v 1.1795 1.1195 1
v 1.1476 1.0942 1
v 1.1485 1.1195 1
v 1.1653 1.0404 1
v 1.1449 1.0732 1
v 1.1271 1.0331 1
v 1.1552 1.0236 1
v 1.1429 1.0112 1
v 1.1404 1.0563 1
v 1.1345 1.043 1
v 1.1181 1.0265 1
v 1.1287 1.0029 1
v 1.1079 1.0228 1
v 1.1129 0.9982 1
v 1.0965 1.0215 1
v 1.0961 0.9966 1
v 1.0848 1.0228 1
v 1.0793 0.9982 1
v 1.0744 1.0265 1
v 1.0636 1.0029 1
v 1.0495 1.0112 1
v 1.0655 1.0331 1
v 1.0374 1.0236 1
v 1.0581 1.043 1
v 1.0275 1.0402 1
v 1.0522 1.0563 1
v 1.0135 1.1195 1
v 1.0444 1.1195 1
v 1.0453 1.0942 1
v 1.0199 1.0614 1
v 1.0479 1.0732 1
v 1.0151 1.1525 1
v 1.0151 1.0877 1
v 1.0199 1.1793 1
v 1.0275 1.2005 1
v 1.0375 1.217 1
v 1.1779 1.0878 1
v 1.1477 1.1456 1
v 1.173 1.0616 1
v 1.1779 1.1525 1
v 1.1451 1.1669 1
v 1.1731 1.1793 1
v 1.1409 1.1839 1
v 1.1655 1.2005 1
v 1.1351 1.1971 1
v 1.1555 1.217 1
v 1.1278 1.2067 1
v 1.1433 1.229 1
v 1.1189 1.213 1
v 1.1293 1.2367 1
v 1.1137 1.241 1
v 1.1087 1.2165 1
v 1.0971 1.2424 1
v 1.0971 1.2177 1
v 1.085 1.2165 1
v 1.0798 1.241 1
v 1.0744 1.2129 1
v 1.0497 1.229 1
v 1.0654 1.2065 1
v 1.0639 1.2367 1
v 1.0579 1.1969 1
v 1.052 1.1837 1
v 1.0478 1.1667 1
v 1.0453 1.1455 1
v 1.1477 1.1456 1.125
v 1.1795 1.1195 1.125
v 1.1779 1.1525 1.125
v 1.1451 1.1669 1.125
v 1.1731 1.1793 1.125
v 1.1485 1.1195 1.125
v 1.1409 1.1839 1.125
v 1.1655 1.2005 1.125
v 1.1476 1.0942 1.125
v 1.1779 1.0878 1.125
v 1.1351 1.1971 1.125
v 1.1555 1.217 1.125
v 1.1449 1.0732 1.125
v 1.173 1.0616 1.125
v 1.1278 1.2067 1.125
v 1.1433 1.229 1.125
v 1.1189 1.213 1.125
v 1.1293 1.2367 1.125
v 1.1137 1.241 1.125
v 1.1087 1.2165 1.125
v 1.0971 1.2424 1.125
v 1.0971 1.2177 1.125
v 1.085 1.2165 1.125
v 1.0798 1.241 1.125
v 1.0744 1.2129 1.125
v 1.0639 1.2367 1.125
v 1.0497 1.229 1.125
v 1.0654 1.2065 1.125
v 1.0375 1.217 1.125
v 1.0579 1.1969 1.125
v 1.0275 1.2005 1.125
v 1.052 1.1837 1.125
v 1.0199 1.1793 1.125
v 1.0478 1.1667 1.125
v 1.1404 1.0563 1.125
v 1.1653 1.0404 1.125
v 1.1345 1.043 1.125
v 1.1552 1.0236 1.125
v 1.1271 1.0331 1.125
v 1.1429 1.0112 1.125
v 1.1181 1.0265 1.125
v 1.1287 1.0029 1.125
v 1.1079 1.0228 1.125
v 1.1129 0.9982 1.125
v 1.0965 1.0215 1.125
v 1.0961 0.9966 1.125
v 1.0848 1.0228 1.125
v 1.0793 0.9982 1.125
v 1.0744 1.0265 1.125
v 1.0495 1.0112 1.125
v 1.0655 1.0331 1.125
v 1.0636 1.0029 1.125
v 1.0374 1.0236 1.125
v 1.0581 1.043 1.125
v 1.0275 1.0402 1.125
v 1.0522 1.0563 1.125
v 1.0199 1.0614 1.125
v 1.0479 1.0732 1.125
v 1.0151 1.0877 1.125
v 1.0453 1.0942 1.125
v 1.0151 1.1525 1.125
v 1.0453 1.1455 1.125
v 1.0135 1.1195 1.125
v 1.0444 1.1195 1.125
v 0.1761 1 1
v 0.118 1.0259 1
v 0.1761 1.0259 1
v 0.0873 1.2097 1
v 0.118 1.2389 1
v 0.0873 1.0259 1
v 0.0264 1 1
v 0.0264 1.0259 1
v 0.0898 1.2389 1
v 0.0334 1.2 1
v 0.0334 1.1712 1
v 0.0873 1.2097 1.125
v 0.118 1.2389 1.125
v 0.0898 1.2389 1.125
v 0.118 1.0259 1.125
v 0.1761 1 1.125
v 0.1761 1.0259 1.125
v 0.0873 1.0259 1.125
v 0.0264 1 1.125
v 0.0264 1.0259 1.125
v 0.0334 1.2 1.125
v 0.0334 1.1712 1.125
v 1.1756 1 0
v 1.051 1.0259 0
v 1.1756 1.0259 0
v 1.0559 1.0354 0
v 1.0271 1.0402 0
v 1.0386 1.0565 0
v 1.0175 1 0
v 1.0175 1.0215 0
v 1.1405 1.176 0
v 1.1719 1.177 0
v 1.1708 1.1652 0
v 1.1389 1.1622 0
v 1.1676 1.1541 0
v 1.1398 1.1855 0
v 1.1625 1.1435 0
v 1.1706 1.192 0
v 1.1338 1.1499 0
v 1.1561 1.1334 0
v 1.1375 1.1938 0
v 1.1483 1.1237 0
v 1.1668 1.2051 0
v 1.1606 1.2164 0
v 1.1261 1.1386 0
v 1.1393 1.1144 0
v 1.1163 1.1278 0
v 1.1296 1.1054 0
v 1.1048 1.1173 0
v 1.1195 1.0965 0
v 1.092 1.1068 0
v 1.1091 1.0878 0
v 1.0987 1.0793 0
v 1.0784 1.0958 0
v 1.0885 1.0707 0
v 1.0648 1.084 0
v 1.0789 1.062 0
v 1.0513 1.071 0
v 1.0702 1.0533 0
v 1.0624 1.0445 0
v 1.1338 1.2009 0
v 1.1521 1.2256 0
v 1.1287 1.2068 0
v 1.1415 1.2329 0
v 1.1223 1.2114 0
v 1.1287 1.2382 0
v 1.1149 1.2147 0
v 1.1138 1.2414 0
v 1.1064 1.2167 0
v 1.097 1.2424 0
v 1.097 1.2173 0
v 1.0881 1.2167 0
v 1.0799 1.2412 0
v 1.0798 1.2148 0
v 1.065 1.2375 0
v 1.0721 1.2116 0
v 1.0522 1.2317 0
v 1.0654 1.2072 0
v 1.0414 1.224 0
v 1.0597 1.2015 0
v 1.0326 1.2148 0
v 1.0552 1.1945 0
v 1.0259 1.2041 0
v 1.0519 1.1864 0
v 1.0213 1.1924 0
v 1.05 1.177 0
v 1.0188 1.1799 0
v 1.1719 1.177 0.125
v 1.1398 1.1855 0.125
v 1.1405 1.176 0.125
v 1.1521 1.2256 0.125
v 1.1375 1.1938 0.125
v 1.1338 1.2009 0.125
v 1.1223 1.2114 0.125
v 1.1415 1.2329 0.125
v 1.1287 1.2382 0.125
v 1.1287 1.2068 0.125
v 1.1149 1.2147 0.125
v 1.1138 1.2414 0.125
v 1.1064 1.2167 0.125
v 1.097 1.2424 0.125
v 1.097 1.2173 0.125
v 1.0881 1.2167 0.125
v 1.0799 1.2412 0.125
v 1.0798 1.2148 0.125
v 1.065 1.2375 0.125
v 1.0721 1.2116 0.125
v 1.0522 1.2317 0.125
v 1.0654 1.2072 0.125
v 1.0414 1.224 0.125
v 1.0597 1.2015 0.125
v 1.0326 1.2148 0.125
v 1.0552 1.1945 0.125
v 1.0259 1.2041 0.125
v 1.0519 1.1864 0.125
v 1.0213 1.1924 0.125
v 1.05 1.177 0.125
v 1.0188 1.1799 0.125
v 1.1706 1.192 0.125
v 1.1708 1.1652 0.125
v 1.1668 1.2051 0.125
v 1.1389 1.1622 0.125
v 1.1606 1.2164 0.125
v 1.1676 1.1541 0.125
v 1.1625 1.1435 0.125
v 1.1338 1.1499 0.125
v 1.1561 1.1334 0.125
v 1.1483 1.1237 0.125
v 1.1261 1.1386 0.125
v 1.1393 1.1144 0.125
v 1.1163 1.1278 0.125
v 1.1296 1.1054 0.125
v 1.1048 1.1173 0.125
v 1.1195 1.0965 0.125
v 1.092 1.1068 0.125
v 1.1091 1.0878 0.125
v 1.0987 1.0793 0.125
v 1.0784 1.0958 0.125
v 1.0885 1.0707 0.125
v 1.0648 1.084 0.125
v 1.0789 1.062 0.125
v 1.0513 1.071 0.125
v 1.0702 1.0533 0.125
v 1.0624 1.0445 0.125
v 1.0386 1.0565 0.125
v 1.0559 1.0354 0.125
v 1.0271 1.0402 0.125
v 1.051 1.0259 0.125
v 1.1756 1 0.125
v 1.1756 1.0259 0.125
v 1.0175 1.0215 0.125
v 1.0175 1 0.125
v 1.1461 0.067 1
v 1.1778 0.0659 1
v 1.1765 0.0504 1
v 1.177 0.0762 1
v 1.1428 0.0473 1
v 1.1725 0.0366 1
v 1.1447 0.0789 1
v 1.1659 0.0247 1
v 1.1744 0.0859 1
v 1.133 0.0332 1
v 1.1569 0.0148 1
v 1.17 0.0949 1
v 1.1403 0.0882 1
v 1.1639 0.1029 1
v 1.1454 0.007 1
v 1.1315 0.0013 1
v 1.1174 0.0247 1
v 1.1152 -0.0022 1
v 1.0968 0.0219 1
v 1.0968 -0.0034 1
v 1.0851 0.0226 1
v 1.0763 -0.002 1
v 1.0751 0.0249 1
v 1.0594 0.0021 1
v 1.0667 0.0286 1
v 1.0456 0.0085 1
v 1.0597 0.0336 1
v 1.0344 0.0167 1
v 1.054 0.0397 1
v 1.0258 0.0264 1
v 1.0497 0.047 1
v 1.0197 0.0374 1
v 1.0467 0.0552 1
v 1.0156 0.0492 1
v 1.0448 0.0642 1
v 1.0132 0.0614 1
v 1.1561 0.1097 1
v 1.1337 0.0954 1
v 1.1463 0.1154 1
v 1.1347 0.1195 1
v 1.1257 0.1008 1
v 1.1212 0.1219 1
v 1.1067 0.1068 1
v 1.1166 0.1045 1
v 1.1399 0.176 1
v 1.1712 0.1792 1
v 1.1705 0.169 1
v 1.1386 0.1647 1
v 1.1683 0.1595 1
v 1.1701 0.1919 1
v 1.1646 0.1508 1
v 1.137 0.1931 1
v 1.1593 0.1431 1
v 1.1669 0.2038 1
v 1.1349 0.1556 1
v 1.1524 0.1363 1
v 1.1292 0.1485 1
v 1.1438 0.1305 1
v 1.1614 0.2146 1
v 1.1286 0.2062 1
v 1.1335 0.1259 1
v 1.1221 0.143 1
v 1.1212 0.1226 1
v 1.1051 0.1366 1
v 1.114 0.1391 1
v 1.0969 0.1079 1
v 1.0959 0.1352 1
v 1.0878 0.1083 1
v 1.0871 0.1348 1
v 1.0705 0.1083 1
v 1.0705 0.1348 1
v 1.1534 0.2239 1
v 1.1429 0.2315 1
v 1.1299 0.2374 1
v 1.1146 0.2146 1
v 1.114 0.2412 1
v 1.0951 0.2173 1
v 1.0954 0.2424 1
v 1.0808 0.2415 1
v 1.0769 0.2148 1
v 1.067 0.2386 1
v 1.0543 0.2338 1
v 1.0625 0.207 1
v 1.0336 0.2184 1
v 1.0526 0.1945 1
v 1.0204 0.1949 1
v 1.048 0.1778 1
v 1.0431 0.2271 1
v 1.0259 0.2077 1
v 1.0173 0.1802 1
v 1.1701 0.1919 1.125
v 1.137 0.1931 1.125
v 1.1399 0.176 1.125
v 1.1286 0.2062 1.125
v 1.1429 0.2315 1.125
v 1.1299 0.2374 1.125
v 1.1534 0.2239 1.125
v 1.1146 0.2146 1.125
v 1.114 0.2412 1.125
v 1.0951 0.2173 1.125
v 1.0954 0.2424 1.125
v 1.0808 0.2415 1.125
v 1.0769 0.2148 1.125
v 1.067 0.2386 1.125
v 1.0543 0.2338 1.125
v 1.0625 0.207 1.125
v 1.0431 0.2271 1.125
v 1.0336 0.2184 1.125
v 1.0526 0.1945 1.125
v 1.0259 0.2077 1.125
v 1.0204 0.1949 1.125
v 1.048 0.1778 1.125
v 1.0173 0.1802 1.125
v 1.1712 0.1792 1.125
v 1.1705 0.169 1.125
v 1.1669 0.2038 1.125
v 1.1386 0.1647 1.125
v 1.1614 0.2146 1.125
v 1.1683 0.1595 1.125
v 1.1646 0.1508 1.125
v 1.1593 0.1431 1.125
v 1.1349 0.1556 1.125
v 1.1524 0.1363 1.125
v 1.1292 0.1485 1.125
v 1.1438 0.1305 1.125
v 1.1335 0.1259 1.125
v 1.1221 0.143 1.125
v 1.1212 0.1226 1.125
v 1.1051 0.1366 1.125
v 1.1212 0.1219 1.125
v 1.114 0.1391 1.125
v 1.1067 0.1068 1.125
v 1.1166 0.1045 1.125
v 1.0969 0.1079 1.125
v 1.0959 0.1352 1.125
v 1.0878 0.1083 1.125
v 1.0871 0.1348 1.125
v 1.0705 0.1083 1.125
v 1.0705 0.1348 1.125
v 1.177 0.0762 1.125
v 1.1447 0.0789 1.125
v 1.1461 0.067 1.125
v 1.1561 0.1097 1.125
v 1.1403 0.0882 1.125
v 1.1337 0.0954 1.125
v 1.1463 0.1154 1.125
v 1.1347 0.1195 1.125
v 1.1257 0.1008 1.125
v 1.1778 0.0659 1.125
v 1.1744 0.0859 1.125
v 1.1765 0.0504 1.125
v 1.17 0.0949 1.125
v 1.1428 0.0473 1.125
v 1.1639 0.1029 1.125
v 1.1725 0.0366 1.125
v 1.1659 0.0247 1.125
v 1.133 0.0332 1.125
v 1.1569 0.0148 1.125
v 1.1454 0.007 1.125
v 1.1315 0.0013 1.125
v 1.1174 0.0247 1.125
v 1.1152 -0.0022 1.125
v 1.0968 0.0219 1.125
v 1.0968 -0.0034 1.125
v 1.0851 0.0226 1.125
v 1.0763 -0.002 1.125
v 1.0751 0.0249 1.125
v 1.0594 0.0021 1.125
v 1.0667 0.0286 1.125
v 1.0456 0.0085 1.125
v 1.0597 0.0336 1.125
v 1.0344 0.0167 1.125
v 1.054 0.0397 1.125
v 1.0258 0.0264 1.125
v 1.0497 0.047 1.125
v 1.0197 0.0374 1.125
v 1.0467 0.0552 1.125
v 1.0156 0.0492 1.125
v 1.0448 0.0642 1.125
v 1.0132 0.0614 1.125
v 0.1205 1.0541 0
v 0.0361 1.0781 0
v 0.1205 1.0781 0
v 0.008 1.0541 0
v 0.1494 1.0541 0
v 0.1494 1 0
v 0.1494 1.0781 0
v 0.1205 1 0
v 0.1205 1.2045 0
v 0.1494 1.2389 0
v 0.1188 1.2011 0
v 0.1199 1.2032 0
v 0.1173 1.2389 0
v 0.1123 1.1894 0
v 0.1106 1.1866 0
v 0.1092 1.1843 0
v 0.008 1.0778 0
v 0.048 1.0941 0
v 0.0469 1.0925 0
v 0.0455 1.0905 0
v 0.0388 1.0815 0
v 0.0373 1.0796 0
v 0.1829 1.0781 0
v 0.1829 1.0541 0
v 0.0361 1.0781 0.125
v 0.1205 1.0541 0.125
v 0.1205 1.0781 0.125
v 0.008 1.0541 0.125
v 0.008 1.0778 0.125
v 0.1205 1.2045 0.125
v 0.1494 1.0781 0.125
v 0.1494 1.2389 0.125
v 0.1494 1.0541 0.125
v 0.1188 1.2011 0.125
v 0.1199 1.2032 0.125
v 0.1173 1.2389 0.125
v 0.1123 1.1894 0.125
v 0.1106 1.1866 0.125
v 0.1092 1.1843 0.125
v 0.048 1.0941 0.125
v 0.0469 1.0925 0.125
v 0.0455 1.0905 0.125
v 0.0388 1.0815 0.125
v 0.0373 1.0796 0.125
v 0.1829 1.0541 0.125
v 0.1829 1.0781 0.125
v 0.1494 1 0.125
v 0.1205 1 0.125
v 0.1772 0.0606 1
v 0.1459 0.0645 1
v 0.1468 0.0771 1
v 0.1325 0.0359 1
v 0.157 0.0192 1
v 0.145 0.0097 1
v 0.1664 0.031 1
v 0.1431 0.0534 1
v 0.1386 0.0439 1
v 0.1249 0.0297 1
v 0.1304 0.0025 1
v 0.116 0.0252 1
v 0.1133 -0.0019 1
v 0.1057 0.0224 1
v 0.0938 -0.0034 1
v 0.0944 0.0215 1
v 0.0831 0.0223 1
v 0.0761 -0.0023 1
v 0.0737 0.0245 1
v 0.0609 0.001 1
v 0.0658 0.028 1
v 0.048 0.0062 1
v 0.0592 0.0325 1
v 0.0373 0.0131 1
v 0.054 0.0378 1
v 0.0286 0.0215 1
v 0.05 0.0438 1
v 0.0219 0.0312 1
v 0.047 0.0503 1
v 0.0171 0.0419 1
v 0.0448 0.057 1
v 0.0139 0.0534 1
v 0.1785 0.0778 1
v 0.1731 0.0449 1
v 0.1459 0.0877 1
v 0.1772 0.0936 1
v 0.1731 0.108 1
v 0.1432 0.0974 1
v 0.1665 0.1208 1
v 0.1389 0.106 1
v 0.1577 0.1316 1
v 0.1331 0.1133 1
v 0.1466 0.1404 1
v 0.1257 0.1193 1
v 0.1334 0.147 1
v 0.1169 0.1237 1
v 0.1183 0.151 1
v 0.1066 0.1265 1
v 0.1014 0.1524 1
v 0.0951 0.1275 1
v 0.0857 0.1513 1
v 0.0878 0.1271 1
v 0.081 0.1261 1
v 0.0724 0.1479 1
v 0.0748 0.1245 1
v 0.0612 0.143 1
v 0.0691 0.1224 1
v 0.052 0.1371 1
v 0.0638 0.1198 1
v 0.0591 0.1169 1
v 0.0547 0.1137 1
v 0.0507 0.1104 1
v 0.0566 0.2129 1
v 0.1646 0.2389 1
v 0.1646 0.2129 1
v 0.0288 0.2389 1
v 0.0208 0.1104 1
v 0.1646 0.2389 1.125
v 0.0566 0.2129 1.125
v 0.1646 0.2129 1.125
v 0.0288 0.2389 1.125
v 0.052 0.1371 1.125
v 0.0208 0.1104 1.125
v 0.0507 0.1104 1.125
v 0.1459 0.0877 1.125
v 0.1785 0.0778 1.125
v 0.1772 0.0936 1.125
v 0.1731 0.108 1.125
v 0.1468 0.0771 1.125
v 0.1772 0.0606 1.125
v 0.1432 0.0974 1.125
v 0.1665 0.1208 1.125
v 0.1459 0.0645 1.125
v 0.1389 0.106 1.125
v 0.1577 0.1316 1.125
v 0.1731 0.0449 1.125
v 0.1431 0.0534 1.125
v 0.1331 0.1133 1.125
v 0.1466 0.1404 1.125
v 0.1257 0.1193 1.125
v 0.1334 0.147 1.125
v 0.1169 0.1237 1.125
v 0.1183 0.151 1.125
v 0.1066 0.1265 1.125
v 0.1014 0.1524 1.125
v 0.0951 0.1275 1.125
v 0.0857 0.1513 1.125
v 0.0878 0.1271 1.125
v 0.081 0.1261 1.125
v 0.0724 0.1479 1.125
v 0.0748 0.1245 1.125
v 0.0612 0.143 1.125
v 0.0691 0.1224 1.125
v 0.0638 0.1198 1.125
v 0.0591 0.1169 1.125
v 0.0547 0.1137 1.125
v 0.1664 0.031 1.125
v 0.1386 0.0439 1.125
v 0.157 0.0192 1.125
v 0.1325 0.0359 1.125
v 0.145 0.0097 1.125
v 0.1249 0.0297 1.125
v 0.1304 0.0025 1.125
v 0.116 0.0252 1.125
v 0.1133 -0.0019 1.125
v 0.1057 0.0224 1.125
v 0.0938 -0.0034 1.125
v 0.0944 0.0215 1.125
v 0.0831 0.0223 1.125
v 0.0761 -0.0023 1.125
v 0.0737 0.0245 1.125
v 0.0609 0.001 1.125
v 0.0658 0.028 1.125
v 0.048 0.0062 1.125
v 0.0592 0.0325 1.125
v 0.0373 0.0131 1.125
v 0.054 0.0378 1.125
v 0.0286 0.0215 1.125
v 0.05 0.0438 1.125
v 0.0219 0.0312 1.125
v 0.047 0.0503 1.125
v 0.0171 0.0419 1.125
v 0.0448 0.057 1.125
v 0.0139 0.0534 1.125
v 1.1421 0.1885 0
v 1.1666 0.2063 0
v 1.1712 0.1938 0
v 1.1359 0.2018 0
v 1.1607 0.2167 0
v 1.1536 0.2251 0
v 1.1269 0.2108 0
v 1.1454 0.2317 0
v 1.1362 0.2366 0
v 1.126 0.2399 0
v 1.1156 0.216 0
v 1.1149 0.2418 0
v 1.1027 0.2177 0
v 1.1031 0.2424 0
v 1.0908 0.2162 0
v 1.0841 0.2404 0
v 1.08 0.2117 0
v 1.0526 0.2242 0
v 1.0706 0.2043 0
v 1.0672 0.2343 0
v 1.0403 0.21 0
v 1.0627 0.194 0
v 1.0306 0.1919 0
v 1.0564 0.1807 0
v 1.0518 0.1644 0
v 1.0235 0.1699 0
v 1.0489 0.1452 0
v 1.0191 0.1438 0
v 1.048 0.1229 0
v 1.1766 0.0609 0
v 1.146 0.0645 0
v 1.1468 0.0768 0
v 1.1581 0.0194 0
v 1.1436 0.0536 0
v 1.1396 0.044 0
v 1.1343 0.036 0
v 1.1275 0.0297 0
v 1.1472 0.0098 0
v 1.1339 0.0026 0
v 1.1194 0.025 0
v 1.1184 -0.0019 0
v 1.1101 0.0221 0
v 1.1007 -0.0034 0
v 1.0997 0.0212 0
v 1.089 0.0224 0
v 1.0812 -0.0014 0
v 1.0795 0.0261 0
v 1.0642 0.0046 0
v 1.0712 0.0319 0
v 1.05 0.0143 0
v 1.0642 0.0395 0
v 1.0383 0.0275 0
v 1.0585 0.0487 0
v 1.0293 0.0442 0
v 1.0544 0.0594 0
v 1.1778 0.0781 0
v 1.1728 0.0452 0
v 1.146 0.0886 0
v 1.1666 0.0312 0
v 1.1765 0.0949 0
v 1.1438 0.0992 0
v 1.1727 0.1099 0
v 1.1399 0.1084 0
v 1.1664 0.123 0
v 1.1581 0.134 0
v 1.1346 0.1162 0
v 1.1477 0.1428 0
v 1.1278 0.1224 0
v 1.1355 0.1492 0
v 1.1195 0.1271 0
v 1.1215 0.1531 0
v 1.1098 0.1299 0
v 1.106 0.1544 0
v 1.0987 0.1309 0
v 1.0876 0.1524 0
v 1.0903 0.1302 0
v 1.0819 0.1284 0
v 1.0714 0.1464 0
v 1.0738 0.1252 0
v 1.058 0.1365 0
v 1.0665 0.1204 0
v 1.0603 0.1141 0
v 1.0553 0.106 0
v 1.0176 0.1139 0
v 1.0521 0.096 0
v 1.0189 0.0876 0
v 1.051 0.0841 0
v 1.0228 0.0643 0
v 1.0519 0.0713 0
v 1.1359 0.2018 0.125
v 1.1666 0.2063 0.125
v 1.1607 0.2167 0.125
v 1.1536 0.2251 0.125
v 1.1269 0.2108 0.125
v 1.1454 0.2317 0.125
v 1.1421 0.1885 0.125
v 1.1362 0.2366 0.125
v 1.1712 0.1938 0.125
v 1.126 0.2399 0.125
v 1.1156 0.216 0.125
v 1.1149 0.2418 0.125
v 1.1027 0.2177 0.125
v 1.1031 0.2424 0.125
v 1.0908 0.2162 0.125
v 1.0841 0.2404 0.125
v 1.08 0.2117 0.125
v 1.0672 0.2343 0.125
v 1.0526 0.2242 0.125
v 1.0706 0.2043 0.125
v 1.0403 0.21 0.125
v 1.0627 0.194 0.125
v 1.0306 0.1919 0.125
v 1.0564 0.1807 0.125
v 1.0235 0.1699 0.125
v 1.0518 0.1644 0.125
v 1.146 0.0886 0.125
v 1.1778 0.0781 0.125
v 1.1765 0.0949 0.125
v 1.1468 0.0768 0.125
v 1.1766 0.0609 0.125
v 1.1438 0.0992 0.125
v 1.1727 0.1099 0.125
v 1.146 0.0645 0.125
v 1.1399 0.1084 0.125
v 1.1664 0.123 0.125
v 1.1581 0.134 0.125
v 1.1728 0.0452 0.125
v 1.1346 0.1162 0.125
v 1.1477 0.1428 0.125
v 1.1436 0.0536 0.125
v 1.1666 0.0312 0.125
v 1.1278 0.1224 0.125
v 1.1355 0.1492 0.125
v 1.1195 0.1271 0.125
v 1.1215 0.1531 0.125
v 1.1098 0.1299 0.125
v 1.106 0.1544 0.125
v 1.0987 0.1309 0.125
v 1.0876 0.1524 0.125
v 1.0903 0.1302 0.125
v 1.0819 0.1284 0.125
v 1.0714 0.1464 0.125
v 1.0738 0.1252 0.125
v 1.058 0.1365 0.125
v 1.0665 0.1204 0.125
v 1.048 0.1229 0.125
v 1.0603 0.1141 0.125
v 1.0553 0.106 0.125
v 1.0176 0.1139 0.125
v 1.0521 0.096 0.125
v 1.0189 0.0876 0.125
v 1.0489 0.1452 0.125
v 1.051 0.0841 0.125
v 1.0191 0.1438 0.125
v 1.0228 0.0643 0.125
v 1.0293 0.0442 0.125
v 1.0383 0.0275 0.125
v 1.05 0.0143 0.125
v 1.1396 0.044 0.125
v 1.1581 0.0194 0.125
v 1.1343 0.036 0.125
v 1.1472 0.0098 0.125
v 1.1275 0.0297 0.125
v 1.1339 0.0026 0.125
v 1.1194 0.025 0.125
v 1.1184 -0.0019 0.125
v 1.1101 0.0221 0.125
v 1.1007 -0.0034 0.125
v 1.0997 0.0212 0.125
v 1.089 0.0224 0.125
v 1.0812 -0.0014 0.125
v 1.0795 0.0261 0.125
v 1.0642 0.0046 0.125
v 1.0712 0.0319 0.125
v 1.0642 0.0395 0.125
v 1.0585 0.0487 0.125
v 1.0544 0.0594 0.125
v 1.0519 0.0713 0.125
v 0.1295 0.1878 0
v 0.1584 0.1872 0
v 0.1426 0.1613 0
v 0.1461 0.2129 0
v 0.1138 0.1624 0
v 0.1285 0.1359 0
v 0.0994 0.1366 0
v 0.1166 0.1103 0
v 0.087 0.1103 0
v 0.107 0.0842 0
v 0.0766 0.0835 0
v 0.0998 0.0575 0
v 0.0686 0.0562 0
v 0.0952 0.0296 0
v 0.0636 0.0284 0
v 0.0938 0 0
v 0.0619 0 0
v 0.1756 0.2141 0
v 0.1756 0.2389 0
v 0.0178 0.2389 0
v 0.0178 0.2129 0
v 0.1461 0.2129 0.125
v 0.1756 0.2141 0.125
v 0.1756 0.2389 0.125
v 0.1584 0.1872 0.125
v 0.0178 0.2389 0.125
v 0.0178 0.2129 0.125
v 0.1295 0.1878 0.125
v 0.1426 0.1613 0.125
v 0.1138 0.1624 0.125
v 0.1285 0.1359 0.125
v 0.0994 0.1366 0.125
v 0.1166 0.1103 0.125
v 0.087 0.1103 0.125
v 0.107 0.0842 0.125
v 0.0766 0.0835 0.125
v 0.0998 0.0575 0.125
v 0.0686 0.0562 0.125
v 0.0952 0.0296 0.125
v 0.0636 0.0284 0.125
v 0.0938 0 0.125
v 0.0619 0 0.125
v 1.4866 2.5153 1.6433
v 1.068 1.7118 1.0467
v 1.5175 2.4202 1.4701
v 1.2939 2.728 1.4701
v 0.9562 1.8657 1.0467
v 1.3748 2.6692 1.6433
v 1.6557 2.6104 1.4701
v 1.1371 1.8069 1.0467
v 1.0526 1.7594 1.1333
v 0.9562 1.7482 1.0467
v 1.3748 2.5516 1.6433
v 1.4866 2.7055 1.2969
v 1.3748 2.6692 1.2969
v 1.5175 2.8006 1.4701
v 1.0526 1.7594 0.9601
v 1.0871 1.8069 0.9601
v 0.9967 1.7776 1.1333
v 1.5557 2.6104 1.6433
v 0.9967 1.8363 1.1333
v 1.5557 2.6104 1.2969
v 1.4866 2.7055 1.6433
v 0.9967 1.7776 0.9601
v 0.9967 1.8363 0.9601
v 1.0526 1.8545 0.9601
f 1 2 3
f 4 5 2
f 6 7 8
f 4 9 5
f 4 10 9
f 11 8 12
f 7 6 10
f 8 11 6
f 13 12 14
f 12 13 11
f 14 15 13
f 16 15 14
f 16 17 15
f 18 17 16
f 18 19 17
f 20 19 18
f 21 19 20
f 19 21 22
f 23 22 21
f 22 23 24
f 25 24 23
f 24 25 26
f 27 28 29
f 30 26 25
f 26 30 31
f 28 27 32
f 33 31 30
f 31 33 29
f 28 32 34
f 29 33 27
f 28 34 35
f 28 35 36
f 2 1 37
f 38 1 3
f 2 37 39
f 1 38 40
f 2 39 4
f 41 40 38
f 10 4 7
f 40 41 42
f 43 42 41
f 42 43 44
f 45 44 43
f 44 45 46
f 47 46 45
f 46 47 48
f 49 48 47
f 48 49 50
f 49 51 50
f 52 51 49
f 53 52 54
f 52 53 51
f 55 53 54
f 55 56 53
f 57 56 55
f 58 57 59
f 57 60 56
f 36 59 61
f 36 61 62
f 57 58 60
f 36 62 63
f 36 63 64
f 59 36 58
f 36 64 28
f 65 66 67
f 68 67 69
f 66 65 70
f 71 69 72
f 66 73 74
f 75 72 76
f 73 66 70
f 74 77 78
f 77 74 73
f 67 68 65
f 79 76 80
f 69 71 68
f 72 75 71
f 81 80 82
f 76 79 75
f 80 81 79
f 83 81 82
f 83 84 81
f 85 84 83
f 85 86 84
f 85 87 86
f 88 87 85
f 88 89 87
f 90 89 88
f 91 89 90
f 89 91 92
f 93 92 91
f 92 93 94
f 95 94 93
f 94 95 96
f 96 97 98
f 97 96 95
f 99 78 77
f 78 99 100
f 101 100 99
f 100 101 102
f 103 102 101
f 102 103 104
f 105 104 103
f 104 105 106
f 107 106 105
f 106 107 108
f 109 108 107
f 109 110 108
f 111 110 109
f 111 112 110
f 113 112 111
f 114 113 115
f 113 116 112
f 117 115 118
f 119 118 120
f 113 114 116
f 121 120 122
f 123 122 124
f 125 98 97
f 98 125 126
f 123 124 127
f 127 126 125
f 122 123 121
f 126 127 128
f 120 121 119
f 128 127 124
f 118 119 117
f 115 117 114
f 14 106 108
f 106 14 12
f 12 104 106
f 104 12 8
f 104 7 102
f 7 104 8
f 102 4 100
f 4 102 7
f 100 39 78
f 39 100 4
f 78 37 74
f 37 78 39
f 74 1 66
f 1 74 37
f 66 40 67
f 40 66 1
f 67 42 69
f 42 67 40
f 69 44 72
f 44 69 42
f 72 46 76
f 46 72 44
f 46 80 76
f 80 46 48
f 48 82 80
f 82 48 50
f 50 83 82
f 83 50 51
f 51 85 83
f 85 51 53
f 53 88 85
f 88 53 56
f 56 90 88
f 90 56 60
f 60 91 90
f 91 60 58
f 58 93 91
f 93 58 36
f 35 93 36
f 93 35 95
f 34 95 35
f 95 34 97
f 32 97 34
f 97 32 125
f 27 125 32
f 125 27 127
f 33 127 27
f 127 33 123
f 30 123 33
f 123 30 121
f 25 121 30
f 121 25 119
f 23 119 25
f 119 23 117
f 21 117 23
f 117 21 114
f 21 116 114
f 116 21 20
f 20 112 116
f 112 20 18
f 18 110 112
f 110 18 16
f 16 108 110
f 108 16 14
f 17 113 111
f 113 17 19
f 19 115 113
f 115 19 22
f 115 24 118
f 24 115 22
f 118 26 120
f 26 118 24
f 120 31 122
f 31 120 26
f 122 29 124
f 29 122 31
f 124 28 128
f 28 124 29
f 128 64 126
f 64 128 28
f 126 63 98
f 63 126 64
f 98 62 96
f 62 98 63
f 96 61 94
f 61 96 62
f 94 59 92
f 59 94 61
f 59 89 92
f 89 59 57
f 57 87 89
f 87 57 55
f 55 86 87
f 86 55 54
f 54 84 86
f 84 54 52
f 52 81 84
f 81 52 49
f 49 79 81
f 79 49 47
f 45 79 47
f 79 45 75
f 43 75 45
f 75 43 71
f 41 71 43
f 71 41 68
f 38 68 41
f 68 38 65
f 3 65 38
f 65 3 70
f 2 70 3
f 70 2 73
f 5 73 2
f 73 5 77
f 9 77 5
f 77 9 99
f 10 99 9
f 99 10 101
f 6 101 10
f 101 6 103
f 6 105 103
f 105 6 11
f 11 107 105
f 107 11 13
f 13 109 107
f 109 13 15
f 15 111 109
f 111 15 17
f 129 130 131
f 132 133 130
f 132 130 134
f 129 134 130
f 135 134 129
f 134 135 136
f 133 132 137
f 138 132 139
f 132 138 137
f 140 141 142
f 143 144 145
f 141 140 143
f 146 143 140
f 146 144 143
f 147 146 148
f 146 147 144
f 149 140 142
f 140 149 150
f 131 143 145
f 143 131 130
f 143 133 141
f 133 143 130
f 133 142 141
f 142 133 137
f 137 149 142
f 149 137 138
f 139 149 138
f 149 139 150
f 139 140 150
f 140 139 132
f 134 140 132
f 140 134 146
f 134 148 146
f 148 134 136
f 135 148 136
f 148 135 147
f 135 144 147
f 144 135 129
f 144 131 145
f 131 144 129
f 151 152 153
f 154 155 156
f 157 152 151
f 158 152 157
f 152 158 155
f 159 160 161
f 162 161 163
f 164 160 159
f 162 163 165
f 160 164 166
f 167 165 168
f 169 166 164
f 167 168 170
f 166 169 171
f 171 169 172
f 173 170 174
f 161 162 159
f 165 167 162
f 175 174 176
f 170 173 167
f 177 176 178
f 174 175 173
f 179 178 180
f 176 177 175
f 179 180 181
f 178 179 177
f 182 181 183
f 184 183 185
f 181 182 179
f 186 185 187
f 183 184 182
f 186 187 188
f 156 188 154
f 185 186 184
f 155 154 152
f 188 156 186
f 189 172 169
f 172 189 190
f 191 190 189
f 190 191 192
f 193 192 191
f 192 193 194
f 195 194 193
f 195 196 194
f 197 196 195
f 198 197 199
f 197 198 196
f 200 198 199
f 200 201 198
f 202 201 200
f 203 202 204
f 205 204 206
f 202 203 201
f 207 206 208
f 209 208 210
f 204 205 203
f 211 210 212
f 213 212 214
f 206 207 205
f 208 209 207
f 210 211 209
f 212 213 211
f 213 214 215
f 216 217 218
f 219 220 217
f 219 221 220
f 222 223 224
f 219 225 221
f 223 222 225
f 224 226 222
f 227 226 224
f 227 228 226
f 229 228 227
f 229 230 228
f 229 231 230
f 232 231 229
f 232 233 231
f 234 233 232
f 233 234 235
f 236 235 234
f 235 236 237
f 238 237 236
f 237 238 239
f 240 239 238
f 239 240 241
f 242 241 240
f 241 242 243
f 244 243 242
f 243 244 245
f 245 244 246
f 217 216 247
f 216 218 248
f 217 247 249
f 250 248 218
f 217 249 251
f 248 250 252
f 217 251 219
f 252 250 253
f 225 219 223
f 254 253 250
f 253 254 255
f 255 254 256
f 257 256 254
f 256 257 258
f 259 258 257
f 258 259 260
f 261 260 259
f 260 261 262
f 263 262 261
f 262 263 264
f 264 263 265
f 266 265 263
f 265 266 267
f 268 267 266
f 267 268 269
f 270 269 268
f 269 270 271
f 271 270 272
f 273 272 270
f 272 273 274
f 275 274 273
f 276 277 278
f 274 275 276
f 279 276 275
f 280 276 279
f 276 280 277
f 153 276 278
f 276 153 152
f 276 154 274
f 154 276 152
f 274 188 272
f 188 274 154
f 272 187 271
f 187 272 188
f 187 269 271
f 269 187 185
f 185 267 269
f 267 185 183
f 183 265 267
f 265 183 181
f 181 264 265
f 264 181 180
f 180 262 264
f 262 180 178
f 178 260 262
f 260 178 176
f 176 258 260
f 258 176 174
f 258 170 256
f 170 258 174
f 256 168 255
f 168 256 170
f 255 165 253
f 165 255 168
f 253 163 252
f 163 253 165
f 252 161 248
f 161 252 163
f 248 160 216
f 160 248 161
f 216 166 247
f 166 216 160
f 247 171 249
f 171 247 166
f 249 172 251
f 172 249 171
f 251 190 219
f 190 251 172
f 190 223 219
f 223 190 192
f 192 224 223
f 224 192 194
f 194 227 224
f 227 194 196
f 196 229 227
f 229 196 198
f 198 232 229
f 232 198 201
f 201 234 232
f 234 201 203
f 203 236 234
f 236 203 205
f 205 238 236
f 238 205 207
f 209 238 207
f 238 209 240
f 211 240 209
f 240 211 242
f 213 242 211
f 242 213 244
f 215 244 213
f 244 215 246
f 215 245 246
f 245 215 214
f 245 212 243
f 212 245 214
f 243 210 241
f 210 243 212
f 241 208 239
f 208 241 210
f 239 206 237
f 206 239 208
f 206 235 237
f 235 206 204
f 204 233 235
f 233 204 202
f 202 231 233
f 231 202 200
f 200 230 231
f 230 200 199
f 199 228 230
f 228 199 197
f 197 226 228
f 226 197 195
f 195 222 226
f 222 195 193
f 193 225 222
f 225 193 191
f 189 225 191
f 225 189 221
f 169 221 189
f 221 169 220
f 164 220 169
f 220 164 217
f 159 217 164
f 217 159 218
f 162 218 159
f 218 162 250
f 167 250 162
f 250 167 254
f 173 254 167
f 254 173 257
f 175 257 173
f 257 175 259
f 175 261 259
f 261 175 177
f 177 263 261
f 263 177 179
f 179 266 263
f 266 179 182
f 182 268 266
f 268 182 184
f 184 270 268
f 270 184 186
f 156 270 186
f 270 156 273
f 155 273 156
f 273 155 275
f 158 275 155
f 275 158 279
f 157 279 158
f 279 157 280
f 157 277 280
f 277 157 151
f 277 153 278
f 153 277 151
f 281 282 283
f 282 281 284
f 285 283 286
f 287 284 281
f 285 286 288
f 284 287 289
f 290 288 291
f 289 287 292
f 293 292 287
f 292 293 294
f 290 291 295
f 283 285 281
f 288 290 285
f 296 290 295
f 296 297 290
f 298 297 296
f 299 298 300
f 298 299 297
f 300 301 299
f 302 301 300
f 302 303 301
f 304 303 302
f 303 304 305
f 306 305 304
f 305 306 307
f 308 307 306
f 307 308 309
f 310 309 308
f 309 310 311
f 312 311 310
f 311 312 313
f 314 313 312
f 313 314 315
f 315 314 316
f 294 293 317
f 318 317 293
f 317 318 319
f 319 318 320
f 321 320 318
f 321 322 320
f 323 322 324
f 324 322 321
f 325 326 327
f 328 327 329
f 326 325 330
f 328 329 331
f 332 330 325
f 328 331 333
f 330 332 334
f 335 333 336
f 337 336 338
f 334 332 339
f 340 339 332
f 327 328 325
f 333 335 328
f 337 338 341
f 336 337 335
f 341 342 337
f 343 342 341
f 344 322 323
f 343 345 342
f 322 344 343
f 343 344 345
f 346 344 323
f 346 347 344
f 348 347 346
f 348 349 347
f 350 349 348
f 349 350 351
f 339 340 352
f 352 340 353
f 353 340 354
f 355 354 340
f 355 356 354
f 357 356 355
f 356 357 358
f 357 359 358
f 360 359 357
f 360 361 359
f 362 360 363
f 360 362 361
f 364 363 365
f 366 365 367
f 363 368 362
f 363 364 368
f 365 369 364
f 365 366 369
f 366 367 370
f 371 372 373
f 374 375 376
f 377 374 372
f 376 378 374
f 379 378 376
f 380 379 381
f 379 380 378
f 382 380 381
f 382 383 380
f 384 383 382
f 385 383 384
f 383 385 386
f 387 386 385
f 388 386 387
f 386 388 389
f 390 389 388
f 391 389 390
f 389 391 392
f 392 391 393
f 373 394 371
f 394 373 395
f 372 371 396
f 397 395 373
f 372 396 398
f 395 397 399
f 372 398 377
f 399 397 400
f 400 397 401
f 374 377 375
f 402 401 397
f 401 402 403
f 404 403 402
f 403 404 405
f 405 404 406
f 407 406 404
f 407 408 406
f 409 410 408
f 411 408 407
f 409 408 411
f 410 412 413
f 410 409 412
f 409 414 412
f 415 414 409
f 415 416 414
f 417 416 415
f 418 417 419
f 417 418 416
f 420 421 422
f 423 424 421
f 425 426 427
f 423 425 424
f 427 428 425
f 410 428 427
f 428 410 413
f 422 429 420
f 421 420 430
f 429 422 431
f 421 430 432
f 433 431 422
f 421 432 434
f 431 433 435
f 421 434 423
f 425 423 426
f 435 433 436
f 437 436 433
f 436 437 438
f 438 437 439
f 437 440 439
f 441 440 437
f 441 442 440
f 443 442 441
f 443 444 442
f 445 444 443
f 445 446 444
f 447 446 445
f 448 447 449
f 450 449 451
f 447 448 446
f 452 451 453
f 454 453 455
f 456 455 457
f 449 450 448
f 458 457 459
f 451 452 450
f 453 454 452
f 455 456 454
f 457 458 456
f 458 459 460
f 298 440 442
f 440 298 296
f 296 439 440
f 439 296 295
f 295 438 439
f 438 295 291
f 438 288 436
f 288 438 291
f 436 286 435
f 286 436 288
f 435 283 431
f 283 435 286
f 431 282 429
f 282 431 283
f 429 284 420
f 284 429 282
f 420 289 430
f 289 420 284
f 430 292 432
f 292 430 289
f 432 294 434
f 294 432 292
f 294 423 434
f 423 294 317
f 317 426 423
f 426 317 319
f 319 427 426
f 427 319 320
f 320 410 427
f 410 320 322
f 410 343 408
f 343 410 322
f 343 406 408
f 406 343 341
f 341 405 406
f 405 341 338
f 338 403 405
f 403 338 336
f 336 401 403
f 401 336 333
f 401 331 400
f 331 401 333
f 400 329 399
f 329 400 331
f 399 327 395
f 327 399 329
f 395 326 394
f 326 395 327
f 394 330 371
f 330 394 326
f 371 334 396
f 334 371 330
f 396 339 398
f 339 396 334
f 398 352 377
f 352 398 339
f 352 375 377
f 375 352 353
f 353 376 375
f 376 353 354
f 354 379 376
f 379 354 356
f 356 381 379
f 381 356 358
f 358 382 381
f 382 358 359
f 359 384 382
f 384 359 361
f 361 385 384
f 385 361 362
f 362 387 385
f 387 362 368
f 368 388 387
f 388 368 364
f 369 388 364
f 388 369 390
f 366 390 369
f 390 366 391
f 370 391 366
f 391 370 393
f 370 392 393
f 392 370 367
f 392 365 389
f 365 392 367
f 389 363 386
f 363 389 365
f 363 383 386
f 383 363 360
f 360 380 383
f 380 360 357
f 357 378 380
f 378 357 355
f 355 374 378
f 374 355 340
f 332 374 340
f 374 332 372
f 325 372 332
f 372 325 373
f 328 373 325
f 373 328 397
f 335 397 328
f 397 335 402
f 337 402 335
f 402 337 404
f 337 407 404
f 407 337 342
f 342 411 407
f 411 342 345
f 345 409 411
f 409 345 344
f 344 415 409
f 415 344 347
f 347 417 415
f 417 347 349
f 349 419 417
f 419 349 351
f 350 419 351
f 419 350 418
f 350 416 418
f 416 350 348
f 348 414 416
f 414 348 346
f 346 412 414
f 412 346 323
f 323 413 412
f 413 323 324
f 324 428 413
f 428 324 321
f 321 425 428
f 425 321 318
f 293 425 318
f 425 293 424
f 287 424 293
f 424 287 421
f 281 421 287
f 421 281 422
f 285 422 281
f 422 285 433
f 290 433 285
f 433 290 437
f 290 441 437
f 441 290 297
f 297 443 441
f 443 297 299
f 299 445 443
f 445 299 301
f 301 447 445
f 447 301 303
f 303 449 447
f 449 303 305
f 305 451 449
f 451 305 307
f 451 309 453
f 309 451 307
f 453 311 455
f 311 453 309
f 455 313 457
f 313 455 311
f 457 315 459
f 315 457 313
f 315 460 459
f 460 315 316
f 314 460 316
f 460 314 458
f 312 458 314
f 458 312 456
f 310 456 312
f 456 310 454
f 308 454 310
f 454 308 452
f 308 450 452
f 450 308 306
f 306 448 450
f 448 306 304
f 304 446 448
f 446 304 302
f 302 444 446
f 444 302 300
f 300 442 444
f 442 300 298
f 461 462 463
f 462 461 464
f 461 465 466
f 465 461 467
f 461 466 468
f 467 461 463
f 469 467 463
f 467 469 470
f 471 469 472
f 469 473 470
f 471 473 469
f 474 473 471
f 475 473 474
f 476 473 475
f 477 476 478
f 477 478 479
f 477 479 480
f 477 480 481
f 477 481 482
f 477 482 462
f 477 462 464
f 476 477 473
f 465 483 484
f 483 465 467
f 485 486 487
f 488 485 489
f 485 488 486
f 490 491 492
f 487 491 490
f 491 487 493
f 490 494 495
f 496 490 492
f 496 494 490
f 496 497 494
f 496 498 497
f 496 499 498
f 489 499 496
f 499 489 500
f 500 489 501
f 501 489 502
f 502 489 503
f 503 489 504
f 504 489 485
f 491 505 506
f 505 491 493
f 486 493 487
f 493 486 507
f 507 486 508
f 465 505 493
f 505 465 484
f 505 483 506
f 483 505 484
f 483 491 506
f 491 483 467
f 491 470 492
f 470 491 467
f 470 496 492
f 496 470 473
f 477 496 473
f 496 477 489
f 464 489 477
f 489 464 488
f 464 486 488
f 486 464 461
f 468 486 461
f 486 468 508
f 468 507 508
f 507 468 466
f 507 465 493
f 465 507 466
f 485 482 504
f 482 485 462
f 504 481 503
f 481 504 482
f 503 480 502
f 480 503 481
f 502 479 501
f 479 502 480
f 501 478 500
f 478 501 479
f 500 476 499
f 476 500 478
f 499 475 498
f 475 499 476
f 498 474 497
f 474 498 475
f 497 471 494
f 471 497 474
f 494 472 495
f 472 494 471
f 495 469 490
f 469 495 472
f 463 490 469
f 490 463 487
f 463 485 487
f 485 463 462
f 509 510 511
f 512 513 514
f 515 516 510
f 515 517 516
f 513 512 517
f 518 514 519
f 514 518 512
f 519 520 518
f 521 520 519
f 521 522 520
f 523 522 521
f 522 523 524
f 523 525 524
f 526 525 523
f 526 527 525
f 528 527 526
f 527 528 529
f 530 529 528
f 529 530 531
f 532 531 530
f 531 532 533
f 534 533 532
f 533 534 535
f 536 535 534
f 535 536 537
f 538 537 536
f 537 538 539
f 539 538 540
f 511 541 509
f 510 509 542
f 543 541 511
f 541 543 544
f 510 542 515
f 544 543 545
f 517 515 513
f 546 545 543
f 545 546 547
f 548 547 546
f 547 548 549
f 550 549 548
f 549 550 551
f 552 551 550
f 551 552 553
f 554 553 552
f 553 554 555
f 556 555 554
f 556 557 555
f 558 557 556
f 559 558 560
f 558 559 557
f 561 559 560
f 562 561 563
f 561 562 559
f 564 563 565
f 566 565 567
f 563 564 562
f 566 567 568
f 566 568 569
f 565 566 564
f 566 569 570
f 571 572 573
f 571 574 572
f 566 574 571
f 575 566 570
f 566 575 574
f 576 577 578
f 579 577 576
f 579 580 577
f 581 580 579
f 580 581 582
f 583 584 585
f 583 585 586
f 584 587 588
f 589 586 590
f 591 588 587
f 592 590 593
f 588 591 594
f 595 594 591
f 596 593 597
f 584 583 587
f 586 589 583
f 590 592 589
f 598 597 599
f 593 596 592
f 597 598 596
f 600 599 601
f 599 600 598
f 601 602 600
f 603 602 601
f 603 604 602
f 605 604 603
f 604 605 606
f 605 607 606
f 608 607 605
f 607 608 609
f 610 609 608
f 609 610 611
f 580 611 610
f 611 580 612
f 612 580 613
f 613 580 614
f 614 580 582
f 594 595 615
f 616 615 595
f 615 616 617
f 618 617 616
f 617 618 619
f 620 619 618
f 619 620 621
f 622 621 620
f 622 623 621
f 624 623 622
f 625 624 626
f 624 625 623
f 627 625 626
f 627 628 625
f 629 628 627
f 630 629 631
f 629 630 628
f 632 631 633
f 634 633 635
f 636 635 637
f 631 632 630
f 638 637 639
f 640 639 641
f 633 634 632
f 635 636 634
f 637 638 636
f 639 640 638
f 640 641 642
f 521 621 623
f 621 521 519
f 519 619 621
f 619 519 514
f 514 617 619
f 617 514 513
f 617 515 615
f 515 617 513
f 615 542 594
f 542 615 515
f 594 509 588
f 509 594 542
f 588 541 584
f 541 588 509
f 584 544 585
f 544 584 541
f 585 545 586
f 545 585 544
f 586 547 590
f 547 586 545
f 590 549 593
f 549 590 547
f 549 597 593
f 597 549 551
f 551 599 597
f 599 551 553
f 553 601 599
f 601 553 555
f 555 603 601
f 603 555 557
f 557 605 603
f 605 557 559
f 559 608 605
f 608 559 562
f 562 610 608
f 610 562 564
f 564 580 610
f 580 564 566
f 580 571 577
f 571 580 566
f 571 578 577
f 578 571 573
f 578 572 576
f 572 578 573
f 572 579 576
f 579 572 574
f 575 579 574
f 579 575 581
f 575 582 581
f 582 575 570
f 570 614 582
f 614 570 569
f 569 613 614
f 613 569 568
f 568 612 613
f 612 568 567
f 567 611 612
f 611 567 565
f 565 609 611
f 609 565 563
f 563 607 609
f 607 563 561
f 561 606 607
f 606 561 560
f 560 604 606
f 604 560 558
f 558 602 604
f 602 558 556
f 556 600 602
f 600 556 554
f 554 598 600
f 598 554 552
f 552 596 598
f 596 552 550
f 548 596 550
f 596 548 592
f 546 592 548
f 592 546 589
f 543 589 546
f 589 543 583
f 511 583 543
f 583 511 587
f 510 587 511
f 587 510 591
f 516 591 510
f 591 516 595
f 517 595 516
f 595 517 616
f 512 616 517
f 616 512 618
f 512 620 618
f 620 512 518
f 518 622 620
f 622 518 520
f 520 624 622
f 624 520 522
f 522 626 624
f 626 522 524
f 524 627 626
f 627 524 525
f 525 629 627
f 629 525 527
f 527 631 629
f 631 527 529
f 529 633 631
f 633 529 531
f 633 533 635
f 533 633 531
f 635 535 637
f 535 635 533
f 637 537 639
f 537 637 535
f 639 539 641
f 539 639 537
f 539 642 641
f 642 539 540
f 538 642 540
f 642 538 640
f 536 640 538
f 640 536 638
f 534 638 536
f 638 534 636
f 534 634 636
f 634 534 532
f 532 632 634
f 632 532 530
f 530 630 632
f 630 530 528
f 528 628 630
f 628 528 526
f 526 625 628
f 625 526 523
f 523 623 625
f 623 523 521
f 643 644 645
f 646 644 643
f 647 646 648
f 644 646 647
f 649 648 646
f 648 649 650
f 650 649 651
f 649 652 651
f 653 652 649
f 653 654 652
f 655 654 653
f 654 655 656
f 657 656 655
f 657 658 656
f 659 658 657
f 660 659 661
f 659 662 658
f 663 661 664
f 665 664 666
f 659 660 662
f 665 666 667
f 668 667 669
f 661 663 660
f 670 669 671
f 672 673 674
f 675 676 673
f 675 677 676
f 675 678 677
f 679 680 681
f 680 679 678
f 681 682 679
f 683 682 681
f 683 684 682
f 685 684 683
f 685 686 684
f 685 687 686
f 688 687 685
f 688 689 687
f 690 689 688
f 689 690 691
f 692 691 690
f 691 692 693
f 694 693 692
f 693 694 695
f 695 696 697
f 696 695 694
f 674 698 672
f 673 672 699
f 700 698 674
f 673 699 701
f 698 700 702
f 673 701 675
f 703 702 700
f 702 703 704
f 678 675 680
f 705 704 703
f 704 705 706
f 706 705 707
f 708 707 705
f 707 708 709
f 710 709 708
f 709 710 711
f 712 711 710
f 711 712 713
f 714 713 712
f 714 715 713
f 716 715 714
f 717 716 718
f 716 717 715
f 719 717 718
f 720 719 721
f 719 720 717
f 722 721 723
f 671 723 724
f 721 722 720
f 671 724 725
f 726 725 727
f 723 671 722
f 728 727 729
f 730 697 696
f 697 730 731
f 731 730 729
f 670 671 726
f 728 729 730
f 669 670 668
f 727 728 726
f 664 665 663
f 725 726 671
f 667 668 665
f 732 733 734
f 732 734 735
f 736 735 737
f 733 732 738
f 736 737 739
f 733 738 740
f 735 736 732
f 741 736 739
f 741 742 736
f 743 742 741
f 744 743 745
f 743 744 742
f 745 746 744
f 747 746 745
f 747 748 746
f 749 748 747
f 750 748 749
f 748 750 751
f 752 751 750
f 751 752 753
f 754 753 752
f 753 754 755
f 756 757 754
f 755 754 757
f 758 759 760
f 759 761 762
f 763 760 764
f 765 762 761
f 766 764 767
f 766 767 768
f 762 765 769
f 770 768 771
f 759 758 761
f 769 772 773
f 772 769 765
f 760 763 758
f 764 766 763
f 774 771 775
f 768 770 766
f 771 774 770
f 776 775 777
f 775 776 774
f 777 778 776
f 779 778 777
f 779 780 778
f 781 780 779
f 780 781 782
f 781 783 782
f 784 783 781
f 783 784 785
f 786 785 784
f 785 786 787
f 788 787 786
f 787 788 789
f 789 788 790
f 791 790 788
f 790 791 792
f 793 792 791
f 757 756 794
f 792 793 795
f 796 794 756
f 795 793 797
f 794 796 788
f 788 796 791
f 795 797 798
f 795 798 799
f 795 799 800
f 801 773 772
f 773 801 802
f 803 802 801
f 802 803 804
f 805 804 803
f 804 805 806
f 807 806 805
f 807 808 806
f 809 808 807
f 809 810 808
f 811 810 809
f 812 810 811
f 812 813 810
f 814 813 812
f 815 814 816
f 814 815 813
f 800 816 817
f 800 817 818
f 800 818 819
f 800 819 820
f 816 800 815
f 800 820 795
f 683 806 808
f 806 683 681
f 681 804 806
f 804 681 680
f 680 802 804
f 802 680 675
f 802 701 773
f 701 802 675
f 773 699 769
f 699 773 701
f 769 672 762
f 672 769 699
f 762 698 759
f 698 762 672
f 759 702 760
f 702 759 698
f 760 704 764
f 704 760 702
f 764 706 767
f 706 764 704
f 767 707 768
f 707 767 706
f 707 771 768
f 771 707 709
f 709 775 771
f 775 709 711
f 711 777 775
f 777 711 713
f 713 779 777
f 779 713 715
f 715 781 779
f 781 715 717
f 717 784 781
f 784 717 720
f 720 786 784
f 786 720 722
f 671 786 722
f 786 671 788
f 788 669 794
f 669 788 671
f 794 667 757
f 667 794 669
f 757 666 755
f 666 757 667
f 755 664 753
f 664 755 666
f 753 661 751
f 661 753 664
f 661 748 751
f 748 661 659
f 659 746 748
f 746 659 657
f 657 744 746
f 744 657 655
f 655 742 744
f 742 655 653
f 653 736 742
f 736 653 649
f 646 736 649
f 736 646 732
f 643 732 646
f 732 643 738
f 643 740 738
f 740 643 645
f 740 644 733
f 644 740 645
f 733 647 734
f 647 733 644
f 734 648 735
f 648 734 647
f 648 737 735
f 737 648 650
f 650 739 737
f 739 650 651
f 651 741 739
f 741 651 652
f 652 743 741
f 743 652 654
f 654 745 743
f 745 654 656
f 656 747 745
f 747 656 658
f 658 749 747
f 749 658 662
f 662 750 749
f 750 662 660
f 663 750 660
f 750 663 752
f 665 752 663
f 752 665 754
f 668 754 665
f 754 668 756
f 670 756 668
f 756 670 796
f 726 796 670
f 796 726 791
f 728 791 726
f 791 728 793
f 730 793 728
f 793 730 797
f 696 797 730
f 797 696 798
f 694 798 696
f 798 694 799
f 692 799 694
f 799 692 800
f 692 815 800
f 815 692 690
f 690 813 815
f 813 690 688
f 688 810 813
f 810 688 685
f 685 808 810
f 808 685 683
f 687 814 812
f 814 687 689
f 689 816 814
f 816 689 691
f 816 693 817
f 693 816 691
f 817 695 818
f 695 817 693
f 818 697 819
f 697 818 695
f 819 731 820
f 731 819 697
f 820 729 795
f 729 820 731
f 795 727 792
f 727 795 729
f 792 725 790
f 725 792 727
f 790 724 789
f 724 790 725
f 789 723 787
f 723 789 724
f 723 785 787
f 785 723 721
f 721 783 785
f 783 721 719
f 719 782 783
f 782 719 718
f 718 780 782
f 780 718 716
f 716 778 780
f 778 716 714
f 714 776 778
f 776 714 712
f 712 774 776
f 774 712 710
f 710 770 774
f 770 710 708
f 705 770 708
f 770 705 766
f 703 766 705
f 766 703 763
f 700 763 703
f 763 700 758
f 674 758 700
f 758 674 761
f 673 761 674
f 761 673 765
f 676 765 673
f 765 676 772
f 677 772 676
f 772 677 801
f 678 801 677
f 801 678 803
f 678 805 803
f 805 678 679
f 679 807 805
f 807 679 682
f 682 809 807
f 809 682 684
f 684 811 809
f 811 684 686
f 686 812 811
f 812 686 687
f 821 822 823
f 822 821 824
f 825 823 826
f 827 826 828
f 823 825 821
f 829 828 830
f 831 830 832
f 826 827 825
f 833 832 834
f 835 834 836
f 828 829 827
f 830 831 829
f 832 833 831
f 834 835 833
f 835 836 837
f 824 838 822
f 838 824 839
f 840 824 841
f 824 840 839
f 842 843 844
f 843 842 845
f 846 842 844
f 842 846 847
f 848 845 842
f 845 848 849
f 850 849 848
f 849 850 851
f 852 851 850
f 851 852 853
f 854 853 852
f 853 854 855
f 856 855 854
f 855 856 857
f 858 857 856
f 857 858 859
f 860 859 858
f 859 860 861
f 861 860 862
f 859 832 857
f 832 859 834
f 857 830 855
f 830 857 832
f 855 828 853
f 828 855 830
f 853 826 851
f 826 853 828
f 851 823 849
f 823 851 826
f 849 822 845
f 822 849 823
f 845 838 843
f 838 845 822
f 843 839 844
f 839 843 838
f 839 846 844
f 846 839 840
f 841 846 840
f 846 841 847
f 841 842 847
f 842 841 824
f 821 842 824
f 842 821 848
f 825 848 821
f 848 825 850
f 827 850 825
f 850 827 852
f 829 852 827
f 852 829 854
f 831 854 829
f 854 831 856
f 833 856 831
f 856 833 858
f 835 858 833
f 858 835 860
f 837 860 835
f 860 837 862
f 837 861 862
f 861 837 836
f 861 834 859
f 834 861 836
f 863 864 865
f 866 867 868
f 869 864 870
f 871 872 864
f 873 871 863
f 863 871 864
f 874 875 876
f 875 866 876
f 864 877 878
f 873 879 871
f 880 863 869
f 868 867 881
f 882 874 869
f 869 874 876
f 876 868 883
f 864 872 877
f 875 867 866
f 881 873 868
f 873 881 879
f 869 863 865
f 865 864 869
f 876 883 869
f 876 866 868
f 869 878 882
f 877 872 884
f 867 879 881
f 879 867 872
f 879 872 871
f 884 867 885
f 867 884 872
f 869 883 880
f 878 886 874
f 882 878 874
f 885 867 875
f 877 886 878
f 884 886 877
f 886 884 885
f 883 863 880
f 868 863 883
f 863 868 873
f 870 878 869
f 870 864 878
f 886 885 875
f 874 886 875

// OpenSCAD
cubesCenters=[for(i=[0:1],j=[0:1],k=[0:1 ])[i,j,k]];


 
uray=[[.2,.2,.2],un(rndc()-[0.5,0.5,0.5])];
ray=[uray[0]+uray[1]*3,-uray[1]];


distances=[each[for(i=cubesCenters)point2Plane(ray,i)]];
sorted =  quicksort( distances);
selection=search(  sorted, distances  ,1,0);
 echo ( selection );

 



for(i=[0:len(selection)-1]) {
translate(cubesCenters[selection[i]])linear_extrude(0.125)text(str(i),0.25);
}

color("Red")
hull(){
    translate(ray[0]) sphere(0.2);
translate(ray[0]+ray[1]) sphere(0.1);
 }
 
 
 echo ( selection );
 
function point2Plane(ray,point)=let(rayOrigin=ray[0],rayNormal=ray[1])((point-rayOrigin)*rayNormal);

function rnd(a = 1, b = 0, s = []) = 
s == [] ? 
(rands(min(a, b), max(   a, b), 1)[0]) 
: 
(rands(min(a, b), max(a, b), 1, s)[0])
; 
function rndc(a=1,b=0)=[rnd(a,b),rnd(a,b),rnd(a,b)];
function lerp(start, end, bias) = (end * bias + start * (1 - bias));
function un(v)=is_list(v)? v/max( is_undef(norm(v))?0:norm(v),1e-16):v;
function quicksort(kvs) = 
  len(kvs)>0
     ? let( 
         pivot   = kvs[floor(len(kvs)/2)], 
         lesser  = [ for (y = kvs) if (y  < pivot) y ], 
         equal   = [ for (y = kvs) if (y == pivot) y ], 
         greater = [ for (y = kvs) if (y  > pivot) y ] )
          concat( quicksort(lesser), equal, quicksort(greater))
      : [];
